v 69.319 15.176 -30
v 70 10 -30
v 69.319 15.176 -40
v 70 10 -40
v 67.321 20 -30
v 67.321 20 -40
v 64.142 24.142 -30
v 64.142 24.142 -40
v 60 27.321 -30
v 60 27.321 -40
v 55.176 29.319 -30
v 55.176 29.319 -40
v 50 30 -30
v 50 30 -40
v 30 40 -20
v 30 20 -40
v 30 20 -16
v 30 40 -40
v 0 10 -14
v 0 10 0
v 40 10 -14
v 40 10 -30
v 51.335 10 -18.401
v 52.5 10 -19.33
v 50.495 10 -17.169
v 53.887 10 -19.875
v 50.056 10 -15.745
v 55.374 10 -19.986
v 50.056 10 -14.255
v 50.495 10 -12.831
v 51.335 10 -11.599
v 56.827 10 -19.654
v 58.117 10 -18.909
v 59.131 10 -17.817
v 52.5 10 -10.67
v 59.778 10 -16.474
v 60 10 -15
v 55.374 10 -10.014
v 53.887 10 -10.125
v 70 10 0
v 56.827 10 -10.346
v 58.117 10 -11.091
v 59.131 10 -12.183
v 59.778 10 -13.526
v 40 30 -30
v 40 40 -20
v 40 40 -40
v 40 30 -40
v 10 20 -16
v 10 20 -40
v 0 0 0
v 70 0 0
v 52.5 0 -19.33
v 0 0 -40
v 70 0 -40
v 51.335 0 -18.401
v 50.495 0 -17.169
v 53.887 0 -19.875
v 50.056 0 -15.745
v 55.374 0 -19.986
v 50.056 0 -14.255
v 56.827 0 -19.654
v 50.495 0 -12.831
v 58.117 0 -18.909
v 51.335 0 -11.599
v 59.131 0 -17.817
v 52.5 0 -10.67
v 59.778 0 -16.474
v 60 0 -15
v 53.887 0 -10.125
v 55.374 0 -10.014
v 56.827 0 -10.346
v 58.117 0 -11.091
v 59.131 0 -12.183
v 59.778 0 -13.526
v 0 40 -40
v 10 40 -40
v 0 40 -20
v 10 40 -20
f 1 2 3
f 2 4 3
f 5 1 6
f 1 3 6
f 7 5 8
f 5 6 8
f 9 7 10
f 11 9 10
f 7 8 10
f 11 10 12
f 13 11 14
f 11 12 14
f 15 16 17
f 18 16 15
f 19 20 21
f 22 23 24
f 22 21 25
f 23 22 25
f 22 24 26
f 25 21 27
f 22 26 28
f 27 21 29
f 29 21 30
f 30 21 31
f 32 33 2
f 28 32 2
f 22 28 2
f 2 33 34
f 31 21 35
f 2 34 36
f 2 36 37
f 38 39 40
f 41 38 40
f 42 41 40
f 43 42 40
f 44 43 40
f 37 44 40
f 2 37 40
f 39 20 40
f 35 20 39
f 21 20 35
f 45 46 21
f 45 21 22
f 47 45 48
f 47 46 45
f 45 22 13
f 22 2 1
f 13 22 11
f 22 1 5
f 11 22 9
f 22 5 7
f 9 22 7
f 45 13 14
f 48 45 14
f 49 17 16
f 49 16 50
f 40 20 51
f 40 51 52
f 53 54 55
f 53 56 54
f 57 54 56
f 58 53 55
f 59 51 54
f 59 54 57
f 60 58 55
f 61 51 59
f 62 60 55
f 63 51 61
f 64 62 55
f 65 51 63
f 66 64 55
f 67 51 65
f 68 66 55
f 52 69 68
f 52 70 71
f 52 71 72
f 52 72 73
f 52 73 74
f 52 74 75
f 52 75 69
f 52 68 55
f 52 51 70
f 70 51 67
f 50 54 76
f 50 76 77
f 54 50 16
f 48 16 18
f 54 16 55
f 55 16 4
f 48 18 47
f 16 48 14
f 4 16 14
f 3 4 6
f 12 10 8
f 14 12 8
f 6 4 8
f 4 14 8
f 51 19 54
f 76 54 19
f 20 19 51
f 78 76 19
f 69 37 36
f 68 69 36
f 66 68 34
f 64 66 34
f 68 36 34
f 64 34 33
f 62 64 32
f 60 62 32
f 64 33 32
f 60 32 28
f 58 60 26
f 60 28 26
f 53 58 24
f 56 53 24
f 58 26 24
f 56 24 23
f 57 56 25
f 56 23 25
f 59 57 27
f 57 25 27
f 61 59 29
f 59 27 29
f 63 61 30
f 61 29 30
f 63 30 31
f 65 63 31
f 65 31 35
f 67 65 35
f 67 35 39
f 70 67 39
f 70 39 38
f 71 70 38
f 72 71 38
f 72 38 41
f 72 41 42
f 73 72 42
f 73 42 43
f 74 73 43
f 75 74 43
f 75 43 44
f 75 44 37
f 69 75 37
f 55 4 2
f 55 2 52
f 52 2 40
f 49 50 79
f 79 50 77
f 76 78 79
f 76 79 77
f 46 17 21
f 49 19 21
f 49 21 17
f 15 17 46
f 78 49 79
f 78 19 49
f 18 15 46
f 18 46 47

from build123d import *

# Parameters (mm, degrees)
BOSS_EXTRUDE1_DEPTH            = 40
SKETCH2_W                      = 40
SKETCH2_H                      = 30
BOSS_EXTRUDE2_DEPTH            = 20
BOSS_EXTRUDE3_DEPTH            = 30
CUT_EXTRUDE1_DEPTH             = 30
SKETCH5_W                      = 70
SKETCH5_H                      = 40
BOSS_EXTRUDE4_DEPTH            = 10
SKETCH6_W                      = 20
SKETCH6_H                      = 20
CUT_EXTRUDE2_DEPTH             = 41
F_10_0_10_DIAMETER_HOLE1_D     = 10
F_10_0_10_DIAMETER_HOLE1_DEPTH = 40
FILLET1_R                      = 20


with BuildPart() as part:
    # Sketch1 → Boss-Extrude1 (new body)
    with BuildSketch(Plane(origin=(0, 0, 0), x_dir=(0, -1, 0), z_dir=(-1, 0, 0))):
        Polygon((-10, -14), (-40, -20), (-10, -20), align=None)
    extrude(amount=-BOSS_EXTRUDE1_DEPTH)

    # Sketch2 → Boss-Extrude2 (add)
    with BuildSketch(Plane(origin=(0, 0, -20), x_dir=(-1, 0, 0), z_dir=(0, 0, -1))):
        with Locations((-20, 25)):
            Rectangle(SKETCH2_W, SKETCH2_H)
    extrude(amount=BOSS_EXTRUDE2_DEPTH)

    # Sketch3 → Boss-Extrude3 (add)
    with BuildSketch(Plane(origin=(40, 0, 0), x_dir=(0, 0, -1), z_dir=(1, 0, 0))):
        Polygon((40, 10), (0, 10), (20, 40), (40, 40), align=None)
    extrude(amount=BOSS_EXTRUDE3_DEPTH)

    # Sketch4 → Cut-Extrude1 (cut)
    with BuildSketch(Plane(origin=(70, 0, 0), x_dir=(0, 0, -1), z_dir=(1, 0, 0))):
        Polygon((20, 40), (0, 10), (30, 10), (30, 30), (40, 30), (40, 40), align=None)
    extrude(amount=-CUT_EXTRUDE1_DEPTH, mode=Mode.SUBTRACT)

    # Sketch5 → Boss-Extrude4 (add)
    with BuildSketch(Plane.XZ.offset(-10)):
        with Locations((35, -20)):
            Rectangle(SKETCH5_W, SKETCH5_H)
    extrude(amount=BOSS_EXTRUDE4_DEPTH)

    # Sketch6 → Cut-Extrude2 (cut, through all)
    with BuildSketch(Plane(origin=(0, 0, -40), x_dir=(-1, 0, 0), z_dir=(0, 0, -1))):
        with Locations((-20, 30)):
            Rectangle(SKETCH6_W, SKETCH6_H)
    extrude(amount=-CUT_EXTRUDE2_DEPTH, mode=Mode.SUBTRACT)

    # Ø10.0 (10) Diameter Hole1
    with Locations(Plane(origin=(0, 0, 0), x_dir=(-1, 0, 0), z_dir=(0, -1, 0))):
        with Locations((-55, 15)):
            Hole(F_10_0_10_DIAMETER_HOLE1_D / 2, depth=F_10_0_10_DIAMETER_HOLE1_DEPTH)

    # Fillet1
    fillet1_edges = [part.edges().sort_by_distance(p)[0] for p in [
        (70, 30, -35),
    ]]
    fillet(fillet1_edges, radius=FILLET1_R)


solid = part.part
